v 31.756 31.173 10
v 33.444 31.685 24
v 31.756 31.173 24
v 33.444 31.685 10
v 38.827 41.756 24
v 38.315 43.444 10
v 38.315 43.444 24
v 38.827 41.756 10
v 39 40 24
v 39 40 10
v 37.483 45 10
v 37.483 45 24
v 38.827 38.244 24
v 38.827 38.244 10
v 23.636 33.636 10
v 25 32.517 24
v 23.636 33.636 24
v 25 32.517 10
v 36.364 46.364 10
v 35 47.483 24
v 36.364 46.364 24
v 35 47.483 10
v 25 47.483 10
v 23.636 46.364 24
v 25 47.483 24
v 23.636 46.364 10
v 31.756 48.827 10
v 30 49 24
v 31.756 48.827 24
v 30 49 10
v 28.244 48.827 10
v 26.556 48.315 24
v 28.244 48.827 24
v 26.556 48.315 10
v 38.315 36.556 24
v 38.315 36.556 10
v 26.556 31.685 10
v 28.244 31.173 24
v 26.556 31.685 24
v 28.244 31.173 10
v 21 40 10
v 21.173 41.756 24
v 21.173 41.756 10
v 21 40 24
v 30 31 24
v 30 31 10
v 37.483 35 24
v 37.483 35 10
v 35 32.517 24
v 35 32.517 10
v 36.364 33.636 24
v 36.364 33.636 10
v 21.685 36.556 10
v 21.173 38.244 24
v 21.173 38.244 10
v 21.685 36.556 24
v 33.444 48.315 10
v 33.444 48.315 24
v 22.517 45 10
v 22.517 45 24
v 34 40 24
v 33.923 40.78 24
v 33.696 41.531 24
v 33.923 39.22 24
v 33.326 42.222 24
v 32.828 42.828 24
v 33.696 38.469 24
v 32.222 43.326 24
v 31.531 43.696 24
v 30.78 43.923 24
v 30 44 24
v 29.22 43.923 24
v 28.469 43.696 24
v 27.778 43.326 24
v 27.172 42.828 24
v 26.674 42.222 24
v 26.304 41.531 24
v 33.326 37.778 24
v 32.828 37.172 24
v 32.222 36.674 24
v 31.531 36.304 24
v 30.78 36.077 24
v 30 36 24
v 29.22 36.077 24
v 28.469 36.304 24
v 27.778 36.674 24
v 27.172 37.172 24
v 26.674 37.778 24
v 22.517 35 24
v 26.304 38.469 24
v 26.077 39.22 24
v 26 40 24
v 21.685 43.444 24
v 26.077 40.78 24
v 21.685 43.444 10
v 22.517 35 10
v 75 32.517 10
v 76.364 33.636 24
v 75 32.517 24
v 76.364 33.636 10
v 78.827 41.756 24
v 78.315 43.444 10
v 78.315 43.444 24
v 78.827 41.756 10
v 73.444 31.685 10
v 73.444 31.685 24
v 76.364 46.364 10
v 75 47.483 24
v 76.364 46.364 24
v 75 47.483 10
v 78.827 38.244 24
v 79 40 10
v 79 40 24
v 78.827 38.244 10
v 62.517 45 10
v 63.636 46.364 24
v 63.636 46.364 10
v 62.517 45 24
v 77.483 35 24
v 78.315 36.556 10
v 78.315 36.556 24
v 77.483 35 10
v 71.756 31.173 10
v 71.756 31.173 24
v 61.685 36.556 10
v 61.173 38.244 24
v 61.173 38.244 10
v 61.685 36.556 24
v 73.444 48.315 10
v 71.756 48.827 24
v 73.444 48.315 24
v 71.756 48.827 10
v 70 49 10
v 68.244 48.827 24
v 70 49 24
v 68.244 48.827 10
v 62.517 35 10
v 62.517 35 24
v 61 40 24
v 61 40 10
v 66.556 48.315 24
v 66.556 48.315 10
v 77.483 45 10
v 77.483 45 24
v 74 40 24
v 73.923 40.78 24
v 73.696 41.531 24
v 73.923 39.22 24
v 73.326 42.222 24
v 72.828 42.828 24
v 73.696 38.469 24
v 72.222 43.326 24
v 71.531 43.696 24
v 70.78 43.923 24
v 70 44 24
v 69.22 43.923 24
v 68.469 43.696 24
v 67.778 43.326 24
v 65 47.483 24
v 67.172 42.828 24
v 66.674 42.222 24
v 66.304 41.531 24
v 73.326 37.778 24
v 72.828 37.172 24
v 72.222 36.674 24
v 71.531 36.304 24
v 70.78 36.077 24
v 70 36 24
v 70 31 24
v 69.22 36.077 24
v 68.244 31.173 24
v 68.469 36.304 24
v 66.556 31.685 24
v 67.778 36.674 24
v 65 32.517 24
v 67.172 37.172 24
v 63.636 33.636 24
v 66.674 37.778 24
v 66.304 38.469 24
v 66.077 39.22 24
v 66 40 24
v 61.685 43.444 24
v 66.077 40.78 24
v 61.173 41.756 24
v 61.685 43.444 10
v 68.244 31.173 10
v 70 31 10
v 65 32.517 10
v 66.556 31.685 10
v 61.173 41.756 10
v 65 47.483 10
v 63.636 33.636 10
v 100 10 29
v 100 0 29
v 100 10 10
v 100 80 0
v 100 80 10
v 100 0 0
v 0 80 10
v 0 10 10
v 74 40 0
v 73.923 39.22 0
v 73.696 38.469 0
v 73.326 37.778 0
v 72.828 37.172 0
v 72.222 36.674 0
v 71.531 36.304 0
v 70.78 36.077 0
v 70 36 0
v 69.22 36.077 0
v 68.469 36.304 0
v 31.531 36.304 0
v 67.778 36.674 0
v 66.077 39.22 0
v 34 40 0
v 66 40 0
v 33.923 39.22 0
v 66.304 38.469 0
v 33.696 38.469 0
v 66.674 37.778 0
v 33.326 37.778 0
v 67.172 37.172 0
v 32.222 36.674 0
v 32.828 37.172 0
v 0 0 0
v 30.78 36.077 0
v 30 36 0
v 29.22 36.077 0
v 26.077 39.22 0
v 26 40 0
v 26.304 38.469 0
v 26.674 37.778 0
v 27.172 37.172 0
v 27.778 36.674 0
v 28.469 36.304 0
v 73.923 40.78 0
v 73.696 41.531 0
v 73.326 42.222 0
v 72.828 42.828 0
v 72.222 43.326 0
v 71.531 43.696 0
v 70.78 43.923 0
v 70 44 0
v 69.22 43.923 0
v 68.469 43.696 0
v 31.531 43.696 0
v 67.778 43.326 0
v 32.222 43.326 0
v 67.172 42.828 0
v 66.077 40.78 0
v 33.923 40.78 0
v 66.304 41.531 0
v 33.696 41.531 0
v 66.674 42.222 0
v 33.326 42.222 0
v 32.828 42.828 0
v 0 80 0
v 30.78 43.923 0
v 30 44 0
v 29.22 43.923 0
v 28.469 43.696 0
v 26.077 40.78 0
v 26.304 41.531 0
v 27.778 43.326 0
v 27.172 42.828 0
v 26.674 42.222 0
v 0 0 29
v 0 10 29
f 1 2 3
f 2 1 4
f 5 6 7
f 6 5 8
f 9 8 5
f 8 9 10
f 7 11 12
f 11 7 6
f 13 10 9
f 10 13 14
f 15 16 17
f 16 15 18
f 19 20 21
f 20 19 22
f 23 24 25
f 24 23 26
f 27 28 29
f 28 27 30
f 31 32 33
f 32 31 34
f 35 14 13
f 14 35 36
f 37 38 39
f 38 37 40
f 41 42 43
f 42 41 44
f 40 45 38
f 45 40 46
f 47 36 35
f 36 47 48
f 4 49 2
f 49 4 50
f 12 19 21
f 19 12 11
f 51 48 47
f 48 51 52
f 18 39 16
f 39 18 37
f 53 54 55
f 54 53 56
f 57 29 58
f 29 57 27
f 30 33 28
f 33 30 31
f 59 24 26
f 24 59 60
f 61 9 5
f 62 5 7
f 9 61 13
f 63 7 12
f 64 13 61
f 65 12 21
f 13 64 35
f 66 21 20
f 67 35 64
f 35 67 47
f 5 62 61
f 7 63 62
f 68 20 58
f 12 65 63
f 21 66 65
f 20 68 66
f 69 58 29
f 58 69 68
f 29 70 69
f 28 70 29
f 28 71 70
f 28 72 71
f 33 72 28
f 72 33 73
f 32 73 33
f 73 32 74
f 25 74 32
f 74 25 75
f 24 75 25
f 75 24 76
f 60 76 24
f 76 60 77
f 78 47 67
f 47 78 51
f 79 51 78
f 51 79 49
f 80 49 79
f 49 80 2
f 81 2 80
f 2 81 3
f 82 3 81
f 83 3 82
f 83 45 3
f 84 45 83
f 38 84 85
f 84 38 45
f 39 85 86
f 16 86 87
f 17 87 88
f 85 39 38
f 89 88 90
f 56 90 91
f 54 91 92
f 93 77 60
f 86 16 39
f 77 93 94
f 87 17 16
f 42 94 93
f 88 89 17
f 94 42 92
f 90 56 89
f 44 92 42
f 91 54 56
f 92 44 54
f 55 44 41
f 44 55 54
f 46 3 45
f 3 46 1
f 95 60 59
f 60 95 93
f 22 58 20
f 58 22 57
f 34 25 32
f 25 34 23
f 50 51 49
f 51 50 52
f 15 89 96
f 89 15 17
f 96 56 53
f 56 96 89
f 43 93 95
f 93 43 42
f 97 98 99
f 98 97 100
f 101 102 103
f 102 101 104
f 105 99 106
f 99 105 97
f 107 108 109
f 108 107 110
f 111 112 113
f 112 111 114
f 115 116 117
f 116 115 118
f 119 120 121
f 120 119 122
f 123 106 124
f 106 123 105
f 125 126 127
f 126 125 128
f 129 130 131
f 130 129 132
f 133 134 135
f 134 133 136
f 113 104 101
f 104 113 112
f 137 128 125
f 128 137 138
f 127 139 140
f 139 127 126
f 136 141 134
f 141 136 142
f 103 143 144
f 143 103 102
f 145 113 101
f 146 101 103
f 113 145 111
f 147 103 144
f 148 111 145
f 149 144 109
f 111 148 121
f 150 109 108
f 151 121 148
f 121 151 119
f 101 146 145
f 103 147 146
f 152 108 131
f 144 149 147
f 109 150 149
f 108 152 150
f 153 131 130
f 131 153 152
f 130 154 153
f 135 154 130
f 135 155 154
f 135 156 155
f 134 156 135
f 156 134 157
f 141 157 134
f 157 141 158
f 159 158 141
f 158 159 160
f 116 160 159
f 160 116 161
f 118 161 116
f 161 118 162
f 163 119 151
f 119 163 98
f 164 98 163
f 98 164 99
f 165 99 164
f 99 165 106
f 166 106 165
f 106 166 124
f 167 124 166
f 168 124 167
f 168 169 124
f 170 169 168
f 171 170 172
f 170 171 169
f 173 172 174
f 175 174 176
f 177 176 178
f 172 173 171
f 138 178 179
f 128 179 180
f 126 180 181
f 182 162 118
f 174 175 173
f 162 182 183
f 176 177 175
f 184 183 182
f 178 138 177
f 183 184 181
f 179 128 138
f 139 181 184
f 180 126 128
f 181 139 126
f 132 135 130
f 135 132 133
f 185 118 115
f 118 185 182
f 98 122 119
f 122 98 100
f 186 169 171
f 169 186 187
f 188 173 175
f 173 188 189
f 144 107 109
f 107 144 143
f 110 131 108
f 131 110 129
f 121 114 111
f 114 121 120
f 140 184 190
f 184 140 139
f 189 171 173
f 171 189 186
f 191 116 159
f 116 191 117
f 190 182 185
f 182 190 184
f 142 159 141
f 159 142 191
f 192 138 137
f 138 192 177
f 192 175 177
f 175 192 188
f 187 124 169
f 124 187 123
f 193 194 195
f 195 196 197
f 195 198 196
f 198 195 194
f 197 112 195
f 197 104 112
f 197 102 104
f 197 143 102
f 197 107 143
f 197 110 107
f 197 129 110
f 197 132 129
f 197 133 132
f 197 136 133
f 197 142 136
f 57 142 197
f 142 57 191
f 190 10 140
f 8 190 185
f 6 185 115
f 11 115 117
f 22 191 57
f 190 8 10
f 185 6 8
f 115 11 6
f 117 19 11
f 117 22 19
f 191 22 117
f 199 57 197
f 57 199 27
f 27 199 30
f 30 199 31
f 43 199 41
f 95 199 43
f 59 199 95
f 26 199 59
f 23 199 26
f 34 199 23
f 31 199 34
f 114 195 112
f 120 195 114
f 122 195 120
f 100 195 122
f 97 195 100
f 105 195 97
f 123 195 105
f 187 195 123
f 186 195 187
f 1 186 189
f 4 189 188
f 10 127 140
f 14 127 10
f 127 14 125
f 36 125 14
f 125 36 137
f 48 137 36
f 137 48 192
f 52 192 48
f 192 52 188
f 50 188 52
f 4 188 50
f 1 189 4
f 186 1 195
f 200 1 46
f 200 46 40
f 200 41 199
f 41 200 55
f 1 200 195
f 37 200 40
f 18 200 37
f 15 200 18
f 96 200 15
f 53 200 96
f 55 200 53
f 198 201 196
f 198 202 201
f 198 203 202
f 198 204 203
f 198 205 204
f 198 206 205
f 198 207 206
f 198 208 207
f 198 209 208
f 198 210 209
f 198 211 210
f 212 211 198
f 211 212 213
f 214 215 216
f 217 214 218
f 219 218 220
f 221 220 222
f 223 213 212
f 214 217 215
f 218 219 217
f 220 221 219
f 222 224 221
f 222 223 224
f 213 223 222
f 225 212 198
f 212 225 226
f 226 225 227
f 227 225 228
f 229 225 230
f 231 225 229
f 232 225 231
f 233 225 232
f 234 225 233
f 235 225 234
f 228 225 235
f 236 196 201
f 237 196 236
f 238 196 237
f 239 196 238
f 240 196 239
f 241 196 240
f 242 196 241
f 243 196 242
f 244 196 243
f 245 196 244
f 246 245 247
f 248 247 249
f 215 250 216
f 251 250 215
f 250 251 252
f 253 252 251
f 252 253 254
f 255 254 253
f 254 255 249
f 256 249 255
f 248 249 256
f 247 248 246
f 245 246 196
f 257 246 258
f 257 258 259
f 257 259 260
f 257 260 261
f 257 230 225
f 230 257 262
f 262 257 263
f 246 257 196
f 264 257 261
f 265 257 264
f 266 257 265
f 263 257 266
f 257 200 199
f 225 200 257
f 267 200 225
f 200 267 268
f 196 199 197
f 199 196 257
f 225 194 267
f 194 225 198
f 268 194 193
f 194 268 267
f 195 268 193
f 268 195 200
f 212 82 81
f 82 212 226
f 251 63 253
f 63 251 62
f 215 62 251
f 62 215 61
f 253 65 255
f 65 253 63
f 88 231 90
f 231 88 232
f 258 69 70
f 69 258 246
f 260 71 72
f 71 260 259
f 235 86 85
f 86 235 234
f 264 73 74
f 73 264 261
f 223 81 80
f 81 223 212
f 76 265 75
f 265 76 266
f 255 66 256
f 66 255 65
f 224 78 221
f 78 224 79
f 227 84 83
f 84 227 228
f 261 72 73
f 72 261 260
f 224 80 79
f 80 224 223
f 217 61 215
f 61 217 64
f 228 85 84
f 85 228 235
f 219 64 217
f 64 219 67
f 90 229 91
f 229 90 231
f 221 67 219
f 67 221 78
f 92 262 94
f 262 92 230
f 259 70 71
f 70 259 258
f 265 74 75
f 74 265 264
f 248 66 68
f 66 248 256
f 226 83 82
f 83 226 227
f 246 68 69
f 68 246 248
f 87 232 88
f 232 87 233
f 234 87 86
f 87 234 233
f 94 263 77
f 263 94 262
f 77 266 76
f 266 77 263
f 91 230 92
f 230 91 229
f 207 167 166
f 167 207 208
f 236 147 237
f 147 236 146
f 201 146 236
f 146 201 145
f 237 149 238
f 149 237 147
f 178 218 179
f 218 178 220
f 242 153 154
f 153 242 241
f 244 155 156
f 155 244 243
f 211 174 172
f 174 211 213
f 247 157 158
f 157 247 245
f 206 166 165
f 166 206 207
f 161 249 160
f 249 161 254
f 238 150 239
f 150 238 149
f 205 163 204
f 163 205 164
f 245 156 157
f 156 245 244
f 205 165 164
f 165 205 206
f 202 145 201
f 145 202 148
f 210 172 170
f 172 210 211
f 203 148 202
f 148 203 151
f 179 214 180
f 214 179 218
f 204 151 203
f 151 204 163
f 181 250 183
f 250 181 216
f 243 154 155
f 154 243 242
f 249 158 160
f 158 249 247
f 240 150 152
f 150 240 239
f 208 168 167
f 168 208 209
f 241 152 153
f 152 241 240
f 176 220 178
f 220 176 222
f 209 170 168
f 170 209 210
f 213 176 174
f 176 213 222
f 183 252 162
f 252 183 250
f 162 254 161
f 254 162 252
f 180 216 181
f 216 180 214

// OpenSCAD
$fn = 32;

// ----------------------------------------------------------------------
// Drill jig: fence jig
// ----------------------------------------------------------------------

// --- parameters (mm) ---
plate_l = 100;            // plate length, X
plate_w = 80;             // plate width, Y
plate_t = 10;             // plate thickness
boss_d = 18;              // guide boss diameter
boss_h = 15;              // boss height above the plate
guide_d = 8;              // guide hole diameter
boss_pitch = 40;          // boss pitch
fence_h = 20;             // fence height above the plate
fence_t = 10;             // fence thickness

n_boss = 2;  // guide bosses
boss_x0 = (plate_l - (n_boss - 1) * boss_pitch) / 2;  // first boss X
boss_top = plate_t - 1 + boss_h;  // boss crown height
fence_top = plate_t - 1 + fence_h;  // fence crown height
total_h = max([fence_top, boss_top]);  // overall height

difference() {
  union() {
  cube([plate_l, plate_w, plate_t]);
  for (i = [0 : n_boss - 1])
    translate([boss_x0 + i * boss_pitch, plate_w / 2, plate_t - 1])
      cylinder(h = boss_h, d = boss_d);
  translate([0, 0, plate_t - 1]) cube([plate_l, fence_t, fence_h]);
  }
  for (i = [0 : n_boss - 1])
    translate([boss_x0 + i * boss_pitch, plate_w / 2, -1])
      cylinder(h = plate_t + boss_h, d = guide_d);
}
